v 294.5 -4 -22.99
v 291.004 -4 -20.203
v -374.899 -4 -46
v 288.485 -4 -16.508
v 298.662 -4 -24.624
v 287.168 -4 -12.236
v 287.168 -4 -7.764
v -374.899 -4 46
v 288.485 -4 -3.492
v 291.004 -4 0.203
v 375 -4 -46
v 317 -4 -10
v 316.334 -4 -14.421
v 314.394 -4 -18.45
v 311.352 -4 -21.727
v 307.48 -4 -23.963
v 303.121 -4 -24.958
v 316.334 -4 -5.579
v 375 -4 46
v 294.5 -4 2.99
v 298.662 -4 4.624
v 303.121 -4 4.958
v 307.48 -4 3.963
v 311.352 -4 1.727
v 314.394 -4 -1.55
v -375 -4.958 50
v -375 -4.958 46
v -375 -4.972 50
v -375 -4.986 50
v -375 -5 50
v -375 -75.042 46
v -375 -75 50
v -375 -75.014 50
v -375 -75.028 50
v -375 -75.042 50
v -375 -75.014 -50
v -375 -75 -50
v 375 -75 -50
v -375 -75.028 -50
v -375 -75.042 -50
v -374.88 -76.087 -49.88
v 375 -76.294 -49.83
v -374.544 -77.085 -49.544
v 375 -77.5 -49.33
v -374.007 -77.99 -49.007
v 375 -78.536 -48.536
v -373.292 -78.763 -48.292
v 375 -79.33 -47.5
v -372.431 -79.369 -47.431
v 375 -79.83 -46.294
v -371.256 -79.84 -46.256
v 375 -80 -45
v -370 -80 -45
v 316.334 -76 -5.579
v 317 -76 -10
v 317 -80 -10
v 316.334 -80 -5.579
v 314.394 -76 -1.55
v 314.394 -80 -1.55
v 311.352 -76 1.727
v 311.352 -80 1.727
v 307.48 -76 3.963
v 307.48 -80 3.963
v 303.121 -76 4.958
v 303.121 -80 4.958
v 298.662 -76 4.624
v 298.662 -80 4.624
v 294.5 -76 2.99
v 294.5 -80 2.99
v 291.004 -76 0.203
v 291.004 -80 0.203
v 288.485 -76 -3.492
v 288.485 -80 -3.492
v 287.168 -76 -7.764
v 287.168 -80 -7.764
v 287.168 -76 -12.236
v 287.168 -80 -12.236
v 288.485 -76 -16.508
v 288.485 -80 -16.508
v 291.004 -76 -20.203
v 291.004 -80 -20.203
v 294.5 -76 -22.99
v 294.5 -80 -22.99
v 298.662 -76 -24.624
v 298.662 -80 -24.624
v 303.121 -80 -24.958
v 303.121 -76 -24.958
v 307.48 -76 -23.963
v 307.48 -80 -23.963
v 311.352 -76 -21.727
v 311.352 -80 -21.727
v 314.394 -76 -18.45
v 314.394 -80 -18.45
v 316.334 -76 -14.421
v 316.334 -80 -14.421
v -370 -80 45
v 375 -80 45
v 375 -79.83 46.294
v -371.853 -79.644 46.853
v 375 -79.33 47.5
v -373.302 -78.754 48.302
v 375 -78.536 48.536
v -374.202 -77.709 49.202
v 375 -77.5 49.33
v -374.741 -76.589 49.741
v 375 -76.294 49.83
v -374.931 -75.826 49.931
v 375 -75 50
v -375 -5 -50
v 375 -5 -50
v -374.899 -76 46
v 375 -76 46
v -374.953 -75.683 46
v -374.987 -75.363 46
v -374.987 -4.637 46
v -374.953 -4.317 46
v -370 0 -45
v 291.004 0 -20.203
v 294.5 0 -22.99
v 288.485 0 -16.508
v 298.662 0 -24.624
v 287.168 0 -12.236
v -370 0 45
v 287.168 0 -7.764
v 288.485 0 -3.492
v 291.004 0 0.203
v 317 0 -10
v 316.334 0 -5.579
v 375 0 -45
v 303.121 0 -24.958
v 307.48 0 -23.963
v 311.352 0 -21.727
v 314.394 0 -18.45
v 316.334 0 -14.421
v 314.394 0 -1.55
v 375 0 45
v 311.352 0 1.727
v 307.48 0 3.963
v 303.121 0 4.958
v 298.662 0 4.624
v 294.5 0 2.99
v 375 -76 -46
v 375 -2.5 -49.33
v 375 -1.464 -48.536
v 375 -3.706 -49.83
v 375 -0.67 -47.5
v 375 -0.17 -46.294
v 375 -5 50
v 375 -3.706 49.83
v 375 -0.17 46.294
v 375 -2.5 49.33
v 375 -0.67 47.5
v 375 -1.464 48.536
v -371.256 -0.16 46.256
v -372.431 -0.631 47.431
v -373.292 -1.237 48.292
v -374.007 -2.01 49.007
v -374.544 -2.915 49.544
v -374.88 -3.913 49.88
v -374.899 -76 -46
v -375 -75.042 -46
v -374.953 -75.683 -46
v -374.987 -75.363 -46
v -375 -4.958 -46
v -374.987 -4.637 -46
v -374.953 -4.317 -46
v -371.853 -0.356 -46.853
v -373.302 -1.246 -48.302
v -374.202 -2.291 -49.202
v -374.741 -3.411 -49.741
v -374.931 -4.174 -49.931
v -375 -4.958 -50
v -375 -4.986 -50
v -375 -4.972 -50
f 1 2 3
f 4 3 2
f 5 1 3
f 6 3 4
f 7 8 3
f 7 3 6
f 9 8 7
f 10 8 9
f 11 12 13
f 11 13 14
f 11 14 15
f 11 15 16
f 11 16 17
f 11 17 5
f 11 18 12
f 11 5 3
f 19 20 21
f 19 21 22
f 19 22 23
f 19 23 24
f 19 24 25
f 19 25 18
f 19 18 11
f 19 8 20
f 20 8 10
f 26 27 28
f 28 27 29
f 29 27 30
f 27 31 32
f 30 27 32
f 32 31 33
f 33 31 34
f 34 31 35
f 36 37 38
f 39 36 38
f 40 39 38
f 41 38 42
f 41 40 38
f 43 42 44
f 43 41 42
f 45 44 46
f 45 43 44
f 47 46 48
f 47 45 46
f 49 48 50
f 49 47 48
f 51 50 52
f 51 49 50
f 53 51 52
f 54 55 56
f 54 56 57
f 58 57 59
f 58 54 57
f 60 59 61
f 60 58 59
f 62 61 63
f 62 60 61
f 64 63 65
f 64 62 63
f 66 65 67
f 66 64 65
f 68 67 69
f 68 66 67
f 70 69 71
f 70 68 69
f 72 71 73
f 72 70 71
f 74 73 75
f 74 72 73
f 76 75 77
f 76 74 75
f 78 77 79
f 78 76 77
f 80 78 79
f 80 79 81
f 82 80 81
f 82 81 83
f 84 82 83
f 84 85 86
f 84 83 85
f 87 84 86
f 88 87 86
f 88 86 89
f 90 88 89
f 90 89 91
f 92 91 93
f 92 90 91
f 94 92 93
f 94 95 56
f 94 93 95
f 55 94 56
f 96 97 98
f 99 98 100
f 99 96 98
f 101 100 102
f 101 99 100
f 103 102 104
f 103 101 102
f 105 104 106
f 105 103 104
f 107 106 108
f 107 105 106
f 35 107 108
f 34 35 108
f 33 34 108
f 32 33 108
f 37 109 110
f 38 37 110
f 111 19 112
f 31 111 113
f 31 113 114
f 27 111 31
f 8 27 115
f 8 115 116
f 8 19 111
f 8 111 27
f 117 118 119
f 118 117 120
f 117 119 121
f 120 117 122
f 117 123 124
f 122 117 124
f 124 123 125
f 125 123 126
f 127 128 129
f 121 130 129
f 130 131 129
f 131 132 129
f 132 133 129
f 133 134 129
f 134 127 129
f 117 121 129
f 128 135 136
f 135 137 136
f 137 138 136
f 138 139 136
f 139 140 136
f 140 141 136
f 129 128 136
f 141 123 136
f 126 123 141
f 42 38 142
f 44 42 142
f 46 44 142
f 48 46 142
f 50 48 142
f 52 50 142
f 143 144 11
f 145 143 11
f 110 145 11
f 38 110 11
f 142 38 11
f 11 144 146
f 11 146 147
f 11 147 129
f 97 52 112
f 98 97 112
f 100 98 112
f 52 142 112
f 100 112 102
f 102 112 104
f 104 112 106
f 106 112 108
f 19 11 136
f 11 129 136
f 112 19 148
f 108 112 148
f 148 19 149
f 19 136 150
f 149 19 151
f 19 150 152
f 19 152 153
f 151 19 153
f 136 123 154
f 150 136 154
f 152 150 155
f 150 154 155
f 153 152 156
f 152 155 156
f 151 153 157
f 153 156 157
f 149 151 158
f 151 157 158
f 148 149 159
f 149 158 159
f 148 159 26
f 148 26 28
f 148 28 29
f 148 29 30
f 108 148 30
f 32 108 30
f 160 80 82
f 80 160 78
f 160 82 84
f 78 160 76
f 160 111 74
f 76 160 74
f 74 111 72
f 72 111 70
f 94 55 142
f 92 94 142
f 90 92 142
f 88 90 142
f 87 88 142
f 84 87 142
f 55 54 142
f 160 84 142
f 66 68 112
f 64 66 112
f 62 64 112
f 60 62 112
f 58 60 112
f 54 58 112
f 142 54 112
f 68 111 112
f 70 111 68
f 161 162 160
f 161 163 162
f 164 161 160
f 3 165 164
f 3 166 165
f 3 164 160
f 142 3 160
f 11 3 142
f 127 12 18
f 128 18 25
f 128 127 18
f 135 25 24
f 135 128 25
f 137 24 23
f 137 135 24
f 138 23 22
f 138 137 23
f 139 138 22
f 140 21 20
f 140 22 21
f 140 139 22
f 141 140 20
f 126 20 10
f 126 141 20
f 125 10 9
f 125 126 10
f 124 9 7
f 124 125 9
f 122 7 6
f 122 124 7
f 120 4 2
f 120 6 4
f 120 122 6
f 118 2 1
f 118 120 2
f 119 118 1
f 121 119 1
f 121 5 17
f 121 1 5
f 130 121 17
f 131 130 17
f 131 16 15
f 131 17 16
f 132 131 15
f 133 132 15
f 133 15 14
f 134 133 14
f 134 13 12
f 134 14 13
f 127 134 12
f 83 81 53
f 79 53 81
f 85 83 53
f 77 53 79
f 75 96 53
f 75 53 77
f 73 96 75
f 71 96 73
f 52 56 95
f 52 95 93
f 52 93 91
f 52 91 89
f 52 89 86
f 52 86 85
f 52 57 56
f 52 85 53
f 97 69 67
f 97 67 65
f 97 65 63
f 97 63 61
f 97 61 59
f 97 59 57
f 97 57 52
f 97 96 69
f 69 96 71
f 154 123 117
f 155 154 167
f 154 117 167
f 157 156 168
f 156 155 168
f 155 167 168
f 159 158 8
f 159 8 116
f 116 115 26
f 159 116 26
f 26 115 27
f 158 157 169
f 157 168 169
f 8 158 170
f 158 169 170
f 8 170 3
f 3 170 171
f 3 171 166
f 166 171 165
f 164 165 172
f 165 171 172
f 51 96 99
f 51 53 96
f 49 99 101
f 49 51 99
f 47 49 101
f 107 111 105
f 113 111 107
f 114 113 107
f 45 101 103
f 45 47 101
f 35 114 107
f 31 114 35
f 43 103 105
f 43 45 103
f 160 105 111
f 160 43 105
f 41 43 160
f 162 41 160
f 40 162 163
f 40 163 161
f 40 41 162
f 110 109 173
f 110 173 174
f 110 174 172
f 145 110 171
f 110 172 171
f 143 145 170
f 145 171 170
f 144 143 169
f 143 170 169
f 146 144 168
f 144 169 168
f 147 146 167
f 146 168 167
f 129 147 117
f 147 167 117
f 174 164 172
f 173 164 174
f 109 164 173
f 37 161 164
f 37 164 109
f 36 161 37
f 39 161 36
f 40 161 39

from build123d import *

# Parameters (mm, degrees)
F1_DEPTH     = 80
F2_T         = 4
F3_T1_DEPTH  = 774.9998275448
F3_T3_DEPTH  = 124.9996550895
F3_T6_ANGLE  = 90.0000000944
F3_T8_ANGLE  = 89.9999999363
F3_T10_ANGLE = 90.0000000944
F3_T12_ANGLE = 89.9999999363
F4_R         = 15
F5_DEPTH     = 80.001


# Not quite as in the source:
# - a fillet or chamfer that OpenCascade refuses, or shapes differently, is made with other operations: its cross-section is extruded or revolved along the edge and cut away or added
# - a shell that OpenCascade refuses in one call is made with other operations: the cavity is built on its own and cut out


with BuildPart() as f1:
    # F0 (on Front) → F1 (new body)
    with BuildSketch(Plane.XZ):
        with BuildLine():
            Line((-374.9998275448, -50), (375, -50))
            Line((375, -50), (375, 50))
            Line((375, 50), (-374.9998275448, 50))
            ThreePointArc((-374.9998275448, 50), (-374.999949489, 49.999949489), (-375, 49.9998275448))
            Line((-375, 49.9998275448), (-375, -49.9998275448))
            ThreePointArc((-375, -49.9998275448), (-374.999949489, -49.999949489), (-374.9998275448, -50))
        make_face()
    extrude(amount=F1_DEPTH)

    # F2: shell of thickness 4, made by hand


with BuildPart() as f2_core1:
    # F2_t2: copy of F1
    add(f1.part)

    # the walls: a layer under each face that stays
    f2_faces = [f2_core1.faces().sort_by_distance(p)[0] for p in [
        (8.62276e-05, -40, -50),
        (8.62276e-05, -40, 50),
        (0, 0, 0),
        (0, -80, 0),
    ]]
    thicken(f2_faces, amount=-F2_T, mode=Mode.SUBTRACT)


with BuildPart() as f1_1:
    add(f1.part)

    # what is left inside the walls is the cavity
    f2_cavity = [f2_core1.part.solids().sort_by_distance(p)[0] for p in [
        (0, -4.04, -16.666667),
    ]]
    add(f2_cavity, mode=Mode.SUBTRACT)

    # F3: fillet of radius 5 on 4 edges, made by hand

    # F3_s2 → F3_t1 (cut)
    with BuildSketch(Plane.YZ.offset(-387.4998275448)):
        with BuildLine():
            ThreePointArc((-80, 45), (-78.5355339059, 48.5355339059), (-75, 50))
            Line((-75, 50), (-80, 50))
            Line((-80, 50), (-80, 45))
        make_face()
        with BuildLine():
            ThreePointArc((0, 45), (-1.4644660941, 48.5355339059), (-5, 50))
            Line((-5, 50), (0, 50))
            Line((0, 50), (0, 45))
        make_face()
        with BuildLine():
            ThreePointArc((-5, -50), (-1.4644660941, -48.5355339059), (0, -45))
            Line((0, -45), (0, -50))
            Line((0, -50), (-5, -50))
        make_face()
        with BuildLine():
            ThreePointArc((-75, -50), (-78.5355339059, -48.5355339059), (-80, -45))
            Line((-80, -45), (-80, -50))
            Line((-80, -50), (-75, -50))
        make_face()
    extrude(amount=F3_T1_DEPTH, mode=Mode.SUBTRACT)

    # F3_s4 → F3_t3 (cut)
    with BuildSketch(Plane.XY.offset(-62.4998275448)):
        with BuildLine():
            ThreePointArc((-370, -80), (-373.5355339059, -78.5355339059), (-375, -75))
            Line((-375, -75), (-375, -80))
            Line((-375, -80), (-370, -80))
        make_face()
        with BuildLine():
            ThreePointArc((-370, 0), (-373.5355339059, -1.4644660941), (-375, -5))
            Line((-375, -5), (-375, 0))
            Line((-375, 0), (-370, 0))
        make_face()
    extrude(amount=F3_T3_DEPTH, mode=Mode.SUBTRACT)

    # F3_s5 → F3_t6 (revolve, cut)
    with BuildSketch(Plane.XY.offset(-49.9998275448)):
        with BuildLine():
            ThreePointArc((-375, -75), (-374.999956886, -75.0207638646), (-374.9998275448, -75.0415273711))
            Line((-374.9998275448, -75.0415273711), (-374.9998275448, -80))
            Line((-374.9998275448, -80), (-375, -80))
            Line((-375, -80), (-375, -75))
        make_face()
    revolve(axis=Axis((-374.9998275448, -80, -49.9998275448), (0, -1, 0)), revolution_arc=F3_T6_ANGLE, mode=Mode.SUBTRACT)

    # F3_s7 → F3_t8 (revolve, cut)
    with BuildSketch(Plane.YZ.offset(-374.9998275448)):
        with BuildLine():
            ThreePointArc((-75.0415273711, 49.9998275448), (-75.0207638646, 49.999956886), (-75, 50))
            Line((-75, 50), (-80, 50))
            Line((-80, 50), (-80, 49.9998275448))
            Line((-80, 49.9998275448), (-75.0415273711, 49.9998275448))
        make_face()
    revolve(axis=Axis((-374.9998275448, -80, 49.9998275448), (0, -1, 0)), revolution_arc=F3_T8_ANGLE, mode=Mode.SUBTRACT)

    # F3_s9 → F3_t10 (revolve, cut)
    with BuildSketch(Plane.XY.offset(-49.9998275448)):
        with BuildLine():
            ThreePointArc((-375, -5), (-374.999956886, -4.9792361354), (-374.9998275448, -4.9584726289))
            Line((-374.9998275448, -4.9584726289), (-374.9998275448, 0))
            Line((-374.9998275448, 0), (-375, 0))
            Line((-375, 0), (-375, -5))
        make_face()
    revolve(axis=Axis((-374.9998275448, 0, -49.9998275448), (0, -1, 0)), revolution_arc=F3_T10_ANGLE, mode=Mode.SUBTRACT)

    # F3_s11 → F3_t12 (revolve, cut)
    with BuildSketch(Plane.YZ.offset(-374.9998275448)):
        with BuildLine():
            ThreePointArc((-4.9584726289, 49.9998275448), (-4.9792361354, 49.999956886), (-5, 50))
            Line((-5, 50), (0, 50))
            Line((0, 50), (0, 49.9998275448))
            Line((0, 49.9998275448), (-4.9584726289, 49.9998275448))
        make_face()
    revolve(axis=Axis((-374.9998275448, 0, 49.9998275448), (0, -1, 0)), revolution_arc=F3_T12_ANGLE, mode=Mode.SUBTRACT)

    # F4 (on Front) → F5 (cut, through all)
    with BuildSketch(Plane.XZ):
        with Locations((302, -10)):
            Circle(F4_R)
    extrude(amount=F5_DEPTH, mode=Mode.SUBTRACT)


solid = f1_1.part
